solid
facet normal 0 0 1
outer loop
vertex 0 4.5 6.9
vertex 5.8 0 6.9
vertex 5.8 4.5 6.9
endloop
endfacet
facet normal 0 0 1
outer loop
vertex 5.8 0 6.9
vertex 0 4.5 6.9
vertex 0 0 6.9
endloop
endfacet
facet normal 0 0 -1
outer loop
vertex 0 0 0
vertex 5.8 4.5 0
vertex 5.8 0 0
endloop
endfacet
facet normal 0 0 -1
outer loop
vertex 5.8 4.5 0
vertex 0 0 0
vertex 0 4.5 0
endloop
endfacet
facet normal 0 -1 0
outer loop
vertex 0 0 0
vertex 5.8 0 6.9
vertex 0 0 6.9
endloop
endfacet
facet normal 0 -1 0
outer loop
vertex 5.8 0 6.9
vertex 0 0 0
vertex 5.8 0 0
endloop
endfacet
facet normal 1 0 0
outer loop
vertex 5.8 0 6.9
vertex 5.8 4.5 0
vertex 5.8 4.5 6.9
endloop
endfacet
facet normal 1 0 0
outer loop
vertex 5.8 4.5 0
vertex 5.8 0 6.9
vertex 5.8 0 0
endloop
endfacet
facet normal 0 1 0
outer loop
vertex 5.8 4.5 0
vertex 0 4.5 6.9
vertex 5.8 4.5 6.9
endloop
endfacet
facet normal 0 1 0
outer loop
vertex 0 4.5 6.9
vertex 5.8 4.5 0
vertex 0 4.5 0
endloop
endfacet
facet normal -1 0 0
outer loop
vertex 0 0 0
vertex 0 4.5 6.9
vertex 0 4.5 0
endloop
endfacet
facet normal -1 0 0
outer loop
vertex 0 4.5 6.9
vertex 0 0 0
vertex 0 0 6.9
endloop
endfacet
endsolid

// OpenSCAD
/*rotate([90,0,0])
union(){
	difference(){
		resize([8.5,5,5.6])
		cube(2);//original cube
		translate([.9,0,2])
		resize([6.75,5,5.7])
		cube(2);//cutout in center
	}//end difference
	
	translate([0,0,5.6])
	resize([2.5,5,1.15])
	cube(2); //left L, corner latch

	translate([6,0,5.6])
	resize([2.5,5,1.15])
	cube(2);//Right latch
}//end union*/

union(){
	difference(){
		resize([5.8,4.5,6.9])
		cube(2);//original cube
		//cut out should have x: .85, y:? z: 6.9(same)
		/*translate([.9,0,2])
		resize([6.75,5,5.7])
		cube(2);//cutout in center*/
	}//end difference
	
	/*translate([0,0,5.6])
	resize([2.5,5,1.15])
	cube(2); //left L, corner latch

	translate([6,0,5.6])
	resize([2.5,5,1.15])
	cube(2);//Right latch*/
}//end union
